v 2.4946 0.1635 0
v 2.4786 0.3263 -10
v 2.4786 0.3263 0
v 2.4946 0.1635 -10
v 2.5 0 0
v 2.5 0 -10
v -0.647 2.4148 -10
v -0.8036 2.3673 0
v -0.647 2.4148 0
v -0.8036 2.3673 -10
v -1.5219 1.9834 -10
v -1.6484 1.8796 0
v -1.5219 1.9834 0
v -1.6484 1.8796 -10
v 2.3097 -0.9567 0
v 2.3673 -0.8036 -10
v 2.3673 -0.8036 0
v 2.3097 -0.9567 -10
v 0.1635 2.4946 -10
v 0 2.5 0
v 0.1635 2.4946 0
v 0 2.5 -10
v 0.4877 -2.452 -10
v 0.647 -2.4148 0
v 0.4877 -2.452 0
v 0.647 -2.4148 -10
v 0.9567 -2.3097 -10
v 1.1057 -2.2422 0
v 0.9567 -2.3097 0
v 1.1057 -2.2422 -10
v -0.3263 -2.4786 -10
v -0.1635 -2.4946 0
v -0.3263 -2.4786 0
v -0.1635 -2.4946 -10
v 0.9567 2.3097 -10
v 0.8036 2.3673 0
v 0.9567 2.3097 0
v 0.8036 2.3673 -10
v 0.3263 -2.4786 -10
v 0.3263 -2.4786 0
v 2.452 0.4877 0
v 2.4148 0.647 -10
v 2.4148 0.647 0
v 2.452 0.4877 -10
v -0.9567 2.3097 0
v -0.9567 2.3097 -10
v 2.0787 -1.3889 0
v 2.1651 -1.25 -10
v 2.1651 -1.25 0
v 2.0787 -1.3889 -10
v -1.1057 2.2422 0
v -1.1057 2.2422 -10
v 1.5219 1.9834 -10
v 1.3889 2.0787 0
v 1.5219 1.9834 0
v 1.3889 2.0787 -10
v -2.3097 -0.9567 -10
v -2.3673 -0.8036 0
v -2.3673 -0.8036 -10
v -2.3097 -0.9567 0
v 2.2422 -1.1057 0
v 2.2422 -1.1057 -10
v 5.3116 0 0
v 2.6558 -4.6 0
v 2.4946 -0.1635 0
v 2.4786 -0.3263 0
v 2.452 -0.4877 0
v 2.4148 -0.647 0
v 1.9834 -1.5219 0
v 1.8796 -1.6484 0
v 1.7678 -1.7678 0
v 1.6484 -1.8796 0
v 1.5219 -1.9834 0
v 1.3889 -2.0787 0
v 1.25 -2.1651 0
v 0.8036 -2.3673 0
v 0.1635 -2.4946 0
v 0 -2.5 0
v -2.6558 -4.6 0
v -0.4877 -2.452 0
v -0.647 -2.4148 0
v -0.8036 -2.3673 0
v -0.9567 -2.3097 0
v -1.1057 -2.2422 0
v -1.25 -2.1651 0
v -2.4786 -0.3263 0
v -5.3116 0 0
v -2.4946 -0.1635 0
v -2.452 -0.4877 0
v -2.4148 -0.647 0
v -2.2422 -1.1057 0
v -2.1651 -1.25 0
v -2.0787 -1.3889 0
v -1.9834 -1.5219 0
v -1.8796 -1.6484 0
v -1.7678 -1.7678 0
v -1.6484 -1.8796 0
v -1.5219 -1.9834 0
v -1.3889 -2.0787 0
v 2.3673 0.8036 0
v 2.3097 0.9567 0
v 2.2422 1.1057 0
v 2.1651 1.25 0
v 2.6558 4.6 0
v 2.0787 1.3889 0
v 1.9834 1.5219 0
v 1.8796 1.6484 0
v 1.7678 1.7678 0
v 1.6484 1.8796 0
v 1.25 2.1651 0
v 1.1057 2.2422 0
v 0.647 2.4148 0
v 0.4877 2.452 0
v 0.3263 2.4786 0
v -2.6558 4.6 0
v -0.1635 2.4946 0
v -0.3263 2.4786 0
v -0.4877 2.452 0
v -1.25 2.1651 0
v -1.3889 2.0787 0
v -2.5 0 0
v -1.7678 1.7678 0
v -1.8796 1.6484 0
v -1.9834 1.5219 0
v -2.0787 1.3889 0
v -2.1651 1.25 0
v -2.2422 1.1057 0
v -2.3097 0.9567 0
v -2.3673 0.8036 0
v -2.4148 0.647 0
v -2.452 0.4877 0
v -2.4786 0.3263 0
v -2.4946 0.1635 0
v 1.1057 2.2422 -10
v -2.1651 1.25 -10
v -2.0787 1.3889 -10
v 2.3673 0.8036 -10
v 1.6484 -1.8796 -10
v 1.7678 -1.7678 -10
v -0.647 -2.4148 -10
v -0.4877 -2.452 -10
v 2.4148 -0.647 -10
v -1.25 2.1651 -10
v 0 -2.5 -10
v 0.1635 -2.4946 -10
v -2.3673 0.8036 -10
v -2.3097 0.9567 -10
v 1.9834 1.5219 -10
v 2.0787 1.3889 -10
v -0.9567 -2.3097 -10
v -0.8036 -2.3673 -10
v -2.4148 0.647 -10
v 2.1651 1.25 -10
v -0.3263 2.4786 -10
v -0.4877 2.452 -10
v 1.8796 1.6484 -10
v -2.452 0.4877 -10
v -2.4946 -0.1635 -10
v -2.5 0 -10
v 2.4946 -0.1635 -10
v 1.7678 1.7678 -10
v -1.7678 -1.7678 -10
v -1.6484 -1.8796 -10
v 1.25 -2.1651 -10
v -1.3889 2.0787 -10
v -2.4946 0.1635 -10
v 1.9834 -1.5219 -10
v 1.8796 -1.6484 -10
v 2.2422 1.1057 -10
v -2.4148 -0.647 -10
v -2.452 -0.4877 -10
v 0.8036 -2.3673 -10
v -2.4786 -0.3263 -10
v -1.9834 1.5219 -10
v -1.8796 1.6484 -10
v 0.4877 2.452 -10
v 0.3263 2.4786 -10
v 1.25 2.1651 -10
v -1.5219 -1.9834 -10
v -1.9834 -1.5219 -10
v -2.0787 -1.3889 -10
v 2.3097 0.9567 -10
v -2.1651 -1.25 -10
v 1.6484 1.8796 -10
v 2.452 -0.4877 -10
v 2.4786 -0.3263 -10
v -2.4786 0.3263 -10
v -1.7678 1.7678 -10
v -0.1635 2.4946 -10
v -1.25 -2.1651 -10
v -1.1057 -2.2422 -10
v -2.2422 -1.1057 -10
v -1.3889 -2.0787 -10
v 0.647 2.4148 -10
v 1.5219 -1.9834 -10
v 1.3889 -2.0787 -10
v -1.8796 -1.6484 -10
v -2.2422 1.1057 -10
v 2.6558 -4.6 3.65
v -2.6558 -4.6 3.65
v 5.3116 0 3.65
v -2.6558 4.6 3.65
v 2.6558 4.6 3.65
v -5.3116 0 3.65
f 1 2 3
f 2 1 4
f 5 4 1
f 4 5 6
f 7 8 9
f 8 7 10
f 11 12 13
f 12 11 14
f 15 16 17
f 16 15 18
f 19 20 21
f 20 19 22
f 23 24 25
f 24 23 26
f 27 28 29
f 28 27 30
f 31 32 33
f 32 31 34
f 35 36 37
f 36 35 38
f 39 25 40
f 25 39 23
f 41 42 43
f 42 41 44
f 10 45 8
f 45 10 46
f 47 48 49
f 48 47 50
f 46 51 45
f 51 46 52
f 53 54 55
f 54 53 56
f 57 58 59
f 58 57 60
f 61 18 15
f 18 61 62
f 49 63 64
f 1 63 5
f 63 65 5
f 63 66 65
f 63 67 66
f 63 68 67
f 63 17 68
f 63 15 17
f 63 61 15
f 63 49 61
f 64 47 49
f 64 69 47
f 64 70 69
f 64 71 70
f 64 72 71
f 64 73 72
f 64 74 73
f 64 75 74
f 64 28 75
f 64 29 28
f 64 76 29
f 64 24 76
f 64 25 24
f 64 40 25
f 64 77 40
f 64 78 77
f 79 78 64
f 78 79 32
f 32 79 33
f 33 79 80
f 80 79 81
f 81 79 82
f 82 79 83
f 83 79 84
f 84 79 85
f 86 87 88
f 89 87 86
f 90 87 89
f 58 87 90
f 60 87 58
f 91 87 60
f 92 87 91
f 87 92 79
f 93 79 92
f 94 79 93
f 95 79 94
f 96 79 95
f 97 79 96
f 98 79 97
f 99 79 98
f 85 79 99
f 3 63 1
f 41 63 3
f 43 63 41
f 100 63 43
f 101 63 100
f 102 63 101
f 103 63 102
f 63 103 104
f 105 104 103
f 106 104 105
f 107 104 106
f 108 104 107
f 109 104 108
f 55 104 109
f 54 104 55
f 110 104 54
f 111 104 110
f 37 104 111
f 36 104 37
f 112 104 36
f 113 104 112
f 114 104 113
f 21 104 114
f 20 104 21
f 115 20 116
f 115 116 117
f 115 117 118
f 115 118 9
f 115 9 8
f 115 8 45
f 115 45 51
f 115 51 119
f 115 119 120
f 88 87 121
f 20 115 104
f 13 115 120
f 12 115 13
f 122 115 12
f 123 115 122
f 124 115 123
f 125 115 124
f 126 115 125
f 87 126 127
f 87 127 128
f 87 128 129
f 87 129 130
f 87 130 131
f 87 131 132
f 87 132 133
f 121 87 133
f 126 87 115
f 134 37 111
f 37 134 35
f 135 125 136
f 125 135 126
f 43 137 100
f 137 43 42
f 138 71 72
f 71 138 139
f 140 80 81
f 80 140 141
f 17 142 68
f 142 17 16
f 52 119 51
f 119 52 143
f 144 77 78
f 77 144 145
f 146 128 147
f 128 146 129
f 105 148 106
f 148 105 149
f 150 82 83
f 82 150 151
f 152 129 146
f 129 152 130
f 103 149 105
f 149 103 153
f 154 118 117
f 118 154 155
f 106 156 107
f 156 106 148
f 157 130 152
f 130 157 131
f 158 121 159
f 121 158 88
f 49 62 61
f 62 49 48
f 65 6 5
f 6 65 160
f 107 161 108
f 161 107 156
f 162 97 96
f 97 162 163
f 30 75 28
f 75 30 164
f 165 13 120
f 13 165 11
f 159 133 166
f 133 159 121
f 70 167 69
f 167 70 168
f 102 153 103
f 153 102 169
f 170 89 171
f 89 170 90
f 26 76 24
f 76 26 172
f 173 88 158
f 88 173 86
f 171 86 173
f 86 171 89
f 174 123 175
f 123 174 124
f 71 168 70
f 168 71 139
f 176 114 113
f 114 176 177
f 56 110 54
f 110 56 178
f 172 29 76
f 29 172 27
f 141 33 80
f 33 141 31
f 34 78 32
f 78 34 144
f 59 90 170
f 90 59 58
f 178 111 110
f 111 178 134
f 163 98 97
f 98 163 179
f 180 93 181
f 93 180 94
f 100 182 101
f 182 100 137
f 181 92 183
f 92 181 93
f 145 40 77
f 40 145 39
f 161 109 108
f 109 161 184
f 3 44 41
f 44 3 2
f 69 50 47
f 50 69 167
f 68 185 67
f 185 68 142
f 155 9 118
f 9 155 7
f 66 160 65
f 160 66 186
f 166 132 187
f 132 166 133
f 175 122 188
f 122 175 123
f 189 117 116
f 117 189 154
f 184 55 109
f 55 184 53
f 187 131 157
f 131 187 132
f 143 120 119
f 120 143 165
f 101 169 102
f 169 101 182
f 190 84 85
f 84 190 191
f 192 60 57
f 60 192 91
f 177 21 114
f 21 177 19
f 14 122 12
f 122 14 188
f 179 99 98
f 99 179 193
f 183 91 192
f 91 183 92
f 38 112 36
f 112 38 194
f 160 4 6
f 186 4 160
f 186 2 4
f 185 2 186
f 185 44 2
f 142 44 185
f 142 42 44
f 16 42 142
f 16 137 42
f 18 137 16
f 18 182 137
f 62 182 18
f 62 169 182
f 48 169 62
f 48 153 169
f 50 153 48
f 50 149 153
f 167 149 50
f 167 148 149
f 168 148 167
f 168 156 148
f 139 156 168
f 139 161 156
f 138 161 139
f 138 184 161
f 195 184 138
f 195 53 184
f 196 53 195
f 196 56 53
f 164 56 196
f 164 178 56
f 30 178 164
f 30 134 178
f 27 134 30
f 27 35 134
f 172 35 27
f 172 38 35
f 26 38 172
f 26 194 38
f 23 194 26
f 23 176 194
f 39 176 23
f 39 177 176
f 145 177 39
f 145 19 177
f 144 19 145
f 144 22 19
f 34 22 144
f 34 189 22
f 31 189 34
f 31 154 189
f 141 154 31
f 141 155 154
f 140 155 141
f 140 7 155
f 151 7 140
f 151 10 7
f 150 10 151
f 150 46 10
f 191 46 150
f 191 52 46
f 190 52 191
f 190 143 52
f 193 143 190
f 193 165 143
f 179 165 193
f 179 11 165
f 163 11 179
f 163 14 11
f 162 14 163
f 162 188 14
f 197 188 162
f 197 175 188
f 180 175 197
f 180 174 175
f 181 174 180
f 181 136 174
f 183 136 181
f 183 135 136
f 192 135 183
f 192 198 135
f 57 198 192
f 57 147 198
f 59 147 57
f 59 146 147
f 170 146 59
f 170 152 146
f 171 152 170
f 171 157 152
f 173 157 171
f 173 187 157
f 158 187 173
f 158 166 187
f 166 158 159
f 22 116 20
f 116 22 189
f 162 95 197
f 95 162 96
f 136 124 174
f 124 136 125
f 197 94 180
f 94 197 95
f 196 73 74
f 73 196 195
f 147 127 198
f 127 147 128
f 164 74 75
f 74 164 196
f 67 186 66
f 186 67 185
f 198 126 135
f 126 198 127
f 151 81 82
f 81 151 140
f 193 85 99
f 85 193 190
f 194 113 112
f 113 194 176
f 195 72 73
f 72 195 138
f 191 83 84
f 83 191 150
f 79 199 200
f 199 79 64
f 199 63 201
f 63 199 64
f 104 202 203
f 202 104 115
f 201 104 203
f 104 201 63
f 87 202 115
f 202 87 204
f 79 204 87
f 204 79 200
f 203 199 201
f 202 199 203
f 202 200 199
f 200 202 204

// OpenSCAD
$fn = 96;

// Dimensions (mm)
shaft_d = 5.0;
shaft_r = shaft_d/2;

head_flat_d = 9.2;          // across flats
head_h = 3.65;

length_under_head = 10.0;   // shaft length (under head)

// Derived: hex circumradius from across-flats
hex_R = head_flat_d / sqrt(3);

union() {
    // Shaft (under head)
    translate([0,0,-length_under_head])
        cylinder(h=length_under_head, r=shaft_r);

    // Hex head
    cylinder(h=head_h, r=hex_R, $fn=6);
}
